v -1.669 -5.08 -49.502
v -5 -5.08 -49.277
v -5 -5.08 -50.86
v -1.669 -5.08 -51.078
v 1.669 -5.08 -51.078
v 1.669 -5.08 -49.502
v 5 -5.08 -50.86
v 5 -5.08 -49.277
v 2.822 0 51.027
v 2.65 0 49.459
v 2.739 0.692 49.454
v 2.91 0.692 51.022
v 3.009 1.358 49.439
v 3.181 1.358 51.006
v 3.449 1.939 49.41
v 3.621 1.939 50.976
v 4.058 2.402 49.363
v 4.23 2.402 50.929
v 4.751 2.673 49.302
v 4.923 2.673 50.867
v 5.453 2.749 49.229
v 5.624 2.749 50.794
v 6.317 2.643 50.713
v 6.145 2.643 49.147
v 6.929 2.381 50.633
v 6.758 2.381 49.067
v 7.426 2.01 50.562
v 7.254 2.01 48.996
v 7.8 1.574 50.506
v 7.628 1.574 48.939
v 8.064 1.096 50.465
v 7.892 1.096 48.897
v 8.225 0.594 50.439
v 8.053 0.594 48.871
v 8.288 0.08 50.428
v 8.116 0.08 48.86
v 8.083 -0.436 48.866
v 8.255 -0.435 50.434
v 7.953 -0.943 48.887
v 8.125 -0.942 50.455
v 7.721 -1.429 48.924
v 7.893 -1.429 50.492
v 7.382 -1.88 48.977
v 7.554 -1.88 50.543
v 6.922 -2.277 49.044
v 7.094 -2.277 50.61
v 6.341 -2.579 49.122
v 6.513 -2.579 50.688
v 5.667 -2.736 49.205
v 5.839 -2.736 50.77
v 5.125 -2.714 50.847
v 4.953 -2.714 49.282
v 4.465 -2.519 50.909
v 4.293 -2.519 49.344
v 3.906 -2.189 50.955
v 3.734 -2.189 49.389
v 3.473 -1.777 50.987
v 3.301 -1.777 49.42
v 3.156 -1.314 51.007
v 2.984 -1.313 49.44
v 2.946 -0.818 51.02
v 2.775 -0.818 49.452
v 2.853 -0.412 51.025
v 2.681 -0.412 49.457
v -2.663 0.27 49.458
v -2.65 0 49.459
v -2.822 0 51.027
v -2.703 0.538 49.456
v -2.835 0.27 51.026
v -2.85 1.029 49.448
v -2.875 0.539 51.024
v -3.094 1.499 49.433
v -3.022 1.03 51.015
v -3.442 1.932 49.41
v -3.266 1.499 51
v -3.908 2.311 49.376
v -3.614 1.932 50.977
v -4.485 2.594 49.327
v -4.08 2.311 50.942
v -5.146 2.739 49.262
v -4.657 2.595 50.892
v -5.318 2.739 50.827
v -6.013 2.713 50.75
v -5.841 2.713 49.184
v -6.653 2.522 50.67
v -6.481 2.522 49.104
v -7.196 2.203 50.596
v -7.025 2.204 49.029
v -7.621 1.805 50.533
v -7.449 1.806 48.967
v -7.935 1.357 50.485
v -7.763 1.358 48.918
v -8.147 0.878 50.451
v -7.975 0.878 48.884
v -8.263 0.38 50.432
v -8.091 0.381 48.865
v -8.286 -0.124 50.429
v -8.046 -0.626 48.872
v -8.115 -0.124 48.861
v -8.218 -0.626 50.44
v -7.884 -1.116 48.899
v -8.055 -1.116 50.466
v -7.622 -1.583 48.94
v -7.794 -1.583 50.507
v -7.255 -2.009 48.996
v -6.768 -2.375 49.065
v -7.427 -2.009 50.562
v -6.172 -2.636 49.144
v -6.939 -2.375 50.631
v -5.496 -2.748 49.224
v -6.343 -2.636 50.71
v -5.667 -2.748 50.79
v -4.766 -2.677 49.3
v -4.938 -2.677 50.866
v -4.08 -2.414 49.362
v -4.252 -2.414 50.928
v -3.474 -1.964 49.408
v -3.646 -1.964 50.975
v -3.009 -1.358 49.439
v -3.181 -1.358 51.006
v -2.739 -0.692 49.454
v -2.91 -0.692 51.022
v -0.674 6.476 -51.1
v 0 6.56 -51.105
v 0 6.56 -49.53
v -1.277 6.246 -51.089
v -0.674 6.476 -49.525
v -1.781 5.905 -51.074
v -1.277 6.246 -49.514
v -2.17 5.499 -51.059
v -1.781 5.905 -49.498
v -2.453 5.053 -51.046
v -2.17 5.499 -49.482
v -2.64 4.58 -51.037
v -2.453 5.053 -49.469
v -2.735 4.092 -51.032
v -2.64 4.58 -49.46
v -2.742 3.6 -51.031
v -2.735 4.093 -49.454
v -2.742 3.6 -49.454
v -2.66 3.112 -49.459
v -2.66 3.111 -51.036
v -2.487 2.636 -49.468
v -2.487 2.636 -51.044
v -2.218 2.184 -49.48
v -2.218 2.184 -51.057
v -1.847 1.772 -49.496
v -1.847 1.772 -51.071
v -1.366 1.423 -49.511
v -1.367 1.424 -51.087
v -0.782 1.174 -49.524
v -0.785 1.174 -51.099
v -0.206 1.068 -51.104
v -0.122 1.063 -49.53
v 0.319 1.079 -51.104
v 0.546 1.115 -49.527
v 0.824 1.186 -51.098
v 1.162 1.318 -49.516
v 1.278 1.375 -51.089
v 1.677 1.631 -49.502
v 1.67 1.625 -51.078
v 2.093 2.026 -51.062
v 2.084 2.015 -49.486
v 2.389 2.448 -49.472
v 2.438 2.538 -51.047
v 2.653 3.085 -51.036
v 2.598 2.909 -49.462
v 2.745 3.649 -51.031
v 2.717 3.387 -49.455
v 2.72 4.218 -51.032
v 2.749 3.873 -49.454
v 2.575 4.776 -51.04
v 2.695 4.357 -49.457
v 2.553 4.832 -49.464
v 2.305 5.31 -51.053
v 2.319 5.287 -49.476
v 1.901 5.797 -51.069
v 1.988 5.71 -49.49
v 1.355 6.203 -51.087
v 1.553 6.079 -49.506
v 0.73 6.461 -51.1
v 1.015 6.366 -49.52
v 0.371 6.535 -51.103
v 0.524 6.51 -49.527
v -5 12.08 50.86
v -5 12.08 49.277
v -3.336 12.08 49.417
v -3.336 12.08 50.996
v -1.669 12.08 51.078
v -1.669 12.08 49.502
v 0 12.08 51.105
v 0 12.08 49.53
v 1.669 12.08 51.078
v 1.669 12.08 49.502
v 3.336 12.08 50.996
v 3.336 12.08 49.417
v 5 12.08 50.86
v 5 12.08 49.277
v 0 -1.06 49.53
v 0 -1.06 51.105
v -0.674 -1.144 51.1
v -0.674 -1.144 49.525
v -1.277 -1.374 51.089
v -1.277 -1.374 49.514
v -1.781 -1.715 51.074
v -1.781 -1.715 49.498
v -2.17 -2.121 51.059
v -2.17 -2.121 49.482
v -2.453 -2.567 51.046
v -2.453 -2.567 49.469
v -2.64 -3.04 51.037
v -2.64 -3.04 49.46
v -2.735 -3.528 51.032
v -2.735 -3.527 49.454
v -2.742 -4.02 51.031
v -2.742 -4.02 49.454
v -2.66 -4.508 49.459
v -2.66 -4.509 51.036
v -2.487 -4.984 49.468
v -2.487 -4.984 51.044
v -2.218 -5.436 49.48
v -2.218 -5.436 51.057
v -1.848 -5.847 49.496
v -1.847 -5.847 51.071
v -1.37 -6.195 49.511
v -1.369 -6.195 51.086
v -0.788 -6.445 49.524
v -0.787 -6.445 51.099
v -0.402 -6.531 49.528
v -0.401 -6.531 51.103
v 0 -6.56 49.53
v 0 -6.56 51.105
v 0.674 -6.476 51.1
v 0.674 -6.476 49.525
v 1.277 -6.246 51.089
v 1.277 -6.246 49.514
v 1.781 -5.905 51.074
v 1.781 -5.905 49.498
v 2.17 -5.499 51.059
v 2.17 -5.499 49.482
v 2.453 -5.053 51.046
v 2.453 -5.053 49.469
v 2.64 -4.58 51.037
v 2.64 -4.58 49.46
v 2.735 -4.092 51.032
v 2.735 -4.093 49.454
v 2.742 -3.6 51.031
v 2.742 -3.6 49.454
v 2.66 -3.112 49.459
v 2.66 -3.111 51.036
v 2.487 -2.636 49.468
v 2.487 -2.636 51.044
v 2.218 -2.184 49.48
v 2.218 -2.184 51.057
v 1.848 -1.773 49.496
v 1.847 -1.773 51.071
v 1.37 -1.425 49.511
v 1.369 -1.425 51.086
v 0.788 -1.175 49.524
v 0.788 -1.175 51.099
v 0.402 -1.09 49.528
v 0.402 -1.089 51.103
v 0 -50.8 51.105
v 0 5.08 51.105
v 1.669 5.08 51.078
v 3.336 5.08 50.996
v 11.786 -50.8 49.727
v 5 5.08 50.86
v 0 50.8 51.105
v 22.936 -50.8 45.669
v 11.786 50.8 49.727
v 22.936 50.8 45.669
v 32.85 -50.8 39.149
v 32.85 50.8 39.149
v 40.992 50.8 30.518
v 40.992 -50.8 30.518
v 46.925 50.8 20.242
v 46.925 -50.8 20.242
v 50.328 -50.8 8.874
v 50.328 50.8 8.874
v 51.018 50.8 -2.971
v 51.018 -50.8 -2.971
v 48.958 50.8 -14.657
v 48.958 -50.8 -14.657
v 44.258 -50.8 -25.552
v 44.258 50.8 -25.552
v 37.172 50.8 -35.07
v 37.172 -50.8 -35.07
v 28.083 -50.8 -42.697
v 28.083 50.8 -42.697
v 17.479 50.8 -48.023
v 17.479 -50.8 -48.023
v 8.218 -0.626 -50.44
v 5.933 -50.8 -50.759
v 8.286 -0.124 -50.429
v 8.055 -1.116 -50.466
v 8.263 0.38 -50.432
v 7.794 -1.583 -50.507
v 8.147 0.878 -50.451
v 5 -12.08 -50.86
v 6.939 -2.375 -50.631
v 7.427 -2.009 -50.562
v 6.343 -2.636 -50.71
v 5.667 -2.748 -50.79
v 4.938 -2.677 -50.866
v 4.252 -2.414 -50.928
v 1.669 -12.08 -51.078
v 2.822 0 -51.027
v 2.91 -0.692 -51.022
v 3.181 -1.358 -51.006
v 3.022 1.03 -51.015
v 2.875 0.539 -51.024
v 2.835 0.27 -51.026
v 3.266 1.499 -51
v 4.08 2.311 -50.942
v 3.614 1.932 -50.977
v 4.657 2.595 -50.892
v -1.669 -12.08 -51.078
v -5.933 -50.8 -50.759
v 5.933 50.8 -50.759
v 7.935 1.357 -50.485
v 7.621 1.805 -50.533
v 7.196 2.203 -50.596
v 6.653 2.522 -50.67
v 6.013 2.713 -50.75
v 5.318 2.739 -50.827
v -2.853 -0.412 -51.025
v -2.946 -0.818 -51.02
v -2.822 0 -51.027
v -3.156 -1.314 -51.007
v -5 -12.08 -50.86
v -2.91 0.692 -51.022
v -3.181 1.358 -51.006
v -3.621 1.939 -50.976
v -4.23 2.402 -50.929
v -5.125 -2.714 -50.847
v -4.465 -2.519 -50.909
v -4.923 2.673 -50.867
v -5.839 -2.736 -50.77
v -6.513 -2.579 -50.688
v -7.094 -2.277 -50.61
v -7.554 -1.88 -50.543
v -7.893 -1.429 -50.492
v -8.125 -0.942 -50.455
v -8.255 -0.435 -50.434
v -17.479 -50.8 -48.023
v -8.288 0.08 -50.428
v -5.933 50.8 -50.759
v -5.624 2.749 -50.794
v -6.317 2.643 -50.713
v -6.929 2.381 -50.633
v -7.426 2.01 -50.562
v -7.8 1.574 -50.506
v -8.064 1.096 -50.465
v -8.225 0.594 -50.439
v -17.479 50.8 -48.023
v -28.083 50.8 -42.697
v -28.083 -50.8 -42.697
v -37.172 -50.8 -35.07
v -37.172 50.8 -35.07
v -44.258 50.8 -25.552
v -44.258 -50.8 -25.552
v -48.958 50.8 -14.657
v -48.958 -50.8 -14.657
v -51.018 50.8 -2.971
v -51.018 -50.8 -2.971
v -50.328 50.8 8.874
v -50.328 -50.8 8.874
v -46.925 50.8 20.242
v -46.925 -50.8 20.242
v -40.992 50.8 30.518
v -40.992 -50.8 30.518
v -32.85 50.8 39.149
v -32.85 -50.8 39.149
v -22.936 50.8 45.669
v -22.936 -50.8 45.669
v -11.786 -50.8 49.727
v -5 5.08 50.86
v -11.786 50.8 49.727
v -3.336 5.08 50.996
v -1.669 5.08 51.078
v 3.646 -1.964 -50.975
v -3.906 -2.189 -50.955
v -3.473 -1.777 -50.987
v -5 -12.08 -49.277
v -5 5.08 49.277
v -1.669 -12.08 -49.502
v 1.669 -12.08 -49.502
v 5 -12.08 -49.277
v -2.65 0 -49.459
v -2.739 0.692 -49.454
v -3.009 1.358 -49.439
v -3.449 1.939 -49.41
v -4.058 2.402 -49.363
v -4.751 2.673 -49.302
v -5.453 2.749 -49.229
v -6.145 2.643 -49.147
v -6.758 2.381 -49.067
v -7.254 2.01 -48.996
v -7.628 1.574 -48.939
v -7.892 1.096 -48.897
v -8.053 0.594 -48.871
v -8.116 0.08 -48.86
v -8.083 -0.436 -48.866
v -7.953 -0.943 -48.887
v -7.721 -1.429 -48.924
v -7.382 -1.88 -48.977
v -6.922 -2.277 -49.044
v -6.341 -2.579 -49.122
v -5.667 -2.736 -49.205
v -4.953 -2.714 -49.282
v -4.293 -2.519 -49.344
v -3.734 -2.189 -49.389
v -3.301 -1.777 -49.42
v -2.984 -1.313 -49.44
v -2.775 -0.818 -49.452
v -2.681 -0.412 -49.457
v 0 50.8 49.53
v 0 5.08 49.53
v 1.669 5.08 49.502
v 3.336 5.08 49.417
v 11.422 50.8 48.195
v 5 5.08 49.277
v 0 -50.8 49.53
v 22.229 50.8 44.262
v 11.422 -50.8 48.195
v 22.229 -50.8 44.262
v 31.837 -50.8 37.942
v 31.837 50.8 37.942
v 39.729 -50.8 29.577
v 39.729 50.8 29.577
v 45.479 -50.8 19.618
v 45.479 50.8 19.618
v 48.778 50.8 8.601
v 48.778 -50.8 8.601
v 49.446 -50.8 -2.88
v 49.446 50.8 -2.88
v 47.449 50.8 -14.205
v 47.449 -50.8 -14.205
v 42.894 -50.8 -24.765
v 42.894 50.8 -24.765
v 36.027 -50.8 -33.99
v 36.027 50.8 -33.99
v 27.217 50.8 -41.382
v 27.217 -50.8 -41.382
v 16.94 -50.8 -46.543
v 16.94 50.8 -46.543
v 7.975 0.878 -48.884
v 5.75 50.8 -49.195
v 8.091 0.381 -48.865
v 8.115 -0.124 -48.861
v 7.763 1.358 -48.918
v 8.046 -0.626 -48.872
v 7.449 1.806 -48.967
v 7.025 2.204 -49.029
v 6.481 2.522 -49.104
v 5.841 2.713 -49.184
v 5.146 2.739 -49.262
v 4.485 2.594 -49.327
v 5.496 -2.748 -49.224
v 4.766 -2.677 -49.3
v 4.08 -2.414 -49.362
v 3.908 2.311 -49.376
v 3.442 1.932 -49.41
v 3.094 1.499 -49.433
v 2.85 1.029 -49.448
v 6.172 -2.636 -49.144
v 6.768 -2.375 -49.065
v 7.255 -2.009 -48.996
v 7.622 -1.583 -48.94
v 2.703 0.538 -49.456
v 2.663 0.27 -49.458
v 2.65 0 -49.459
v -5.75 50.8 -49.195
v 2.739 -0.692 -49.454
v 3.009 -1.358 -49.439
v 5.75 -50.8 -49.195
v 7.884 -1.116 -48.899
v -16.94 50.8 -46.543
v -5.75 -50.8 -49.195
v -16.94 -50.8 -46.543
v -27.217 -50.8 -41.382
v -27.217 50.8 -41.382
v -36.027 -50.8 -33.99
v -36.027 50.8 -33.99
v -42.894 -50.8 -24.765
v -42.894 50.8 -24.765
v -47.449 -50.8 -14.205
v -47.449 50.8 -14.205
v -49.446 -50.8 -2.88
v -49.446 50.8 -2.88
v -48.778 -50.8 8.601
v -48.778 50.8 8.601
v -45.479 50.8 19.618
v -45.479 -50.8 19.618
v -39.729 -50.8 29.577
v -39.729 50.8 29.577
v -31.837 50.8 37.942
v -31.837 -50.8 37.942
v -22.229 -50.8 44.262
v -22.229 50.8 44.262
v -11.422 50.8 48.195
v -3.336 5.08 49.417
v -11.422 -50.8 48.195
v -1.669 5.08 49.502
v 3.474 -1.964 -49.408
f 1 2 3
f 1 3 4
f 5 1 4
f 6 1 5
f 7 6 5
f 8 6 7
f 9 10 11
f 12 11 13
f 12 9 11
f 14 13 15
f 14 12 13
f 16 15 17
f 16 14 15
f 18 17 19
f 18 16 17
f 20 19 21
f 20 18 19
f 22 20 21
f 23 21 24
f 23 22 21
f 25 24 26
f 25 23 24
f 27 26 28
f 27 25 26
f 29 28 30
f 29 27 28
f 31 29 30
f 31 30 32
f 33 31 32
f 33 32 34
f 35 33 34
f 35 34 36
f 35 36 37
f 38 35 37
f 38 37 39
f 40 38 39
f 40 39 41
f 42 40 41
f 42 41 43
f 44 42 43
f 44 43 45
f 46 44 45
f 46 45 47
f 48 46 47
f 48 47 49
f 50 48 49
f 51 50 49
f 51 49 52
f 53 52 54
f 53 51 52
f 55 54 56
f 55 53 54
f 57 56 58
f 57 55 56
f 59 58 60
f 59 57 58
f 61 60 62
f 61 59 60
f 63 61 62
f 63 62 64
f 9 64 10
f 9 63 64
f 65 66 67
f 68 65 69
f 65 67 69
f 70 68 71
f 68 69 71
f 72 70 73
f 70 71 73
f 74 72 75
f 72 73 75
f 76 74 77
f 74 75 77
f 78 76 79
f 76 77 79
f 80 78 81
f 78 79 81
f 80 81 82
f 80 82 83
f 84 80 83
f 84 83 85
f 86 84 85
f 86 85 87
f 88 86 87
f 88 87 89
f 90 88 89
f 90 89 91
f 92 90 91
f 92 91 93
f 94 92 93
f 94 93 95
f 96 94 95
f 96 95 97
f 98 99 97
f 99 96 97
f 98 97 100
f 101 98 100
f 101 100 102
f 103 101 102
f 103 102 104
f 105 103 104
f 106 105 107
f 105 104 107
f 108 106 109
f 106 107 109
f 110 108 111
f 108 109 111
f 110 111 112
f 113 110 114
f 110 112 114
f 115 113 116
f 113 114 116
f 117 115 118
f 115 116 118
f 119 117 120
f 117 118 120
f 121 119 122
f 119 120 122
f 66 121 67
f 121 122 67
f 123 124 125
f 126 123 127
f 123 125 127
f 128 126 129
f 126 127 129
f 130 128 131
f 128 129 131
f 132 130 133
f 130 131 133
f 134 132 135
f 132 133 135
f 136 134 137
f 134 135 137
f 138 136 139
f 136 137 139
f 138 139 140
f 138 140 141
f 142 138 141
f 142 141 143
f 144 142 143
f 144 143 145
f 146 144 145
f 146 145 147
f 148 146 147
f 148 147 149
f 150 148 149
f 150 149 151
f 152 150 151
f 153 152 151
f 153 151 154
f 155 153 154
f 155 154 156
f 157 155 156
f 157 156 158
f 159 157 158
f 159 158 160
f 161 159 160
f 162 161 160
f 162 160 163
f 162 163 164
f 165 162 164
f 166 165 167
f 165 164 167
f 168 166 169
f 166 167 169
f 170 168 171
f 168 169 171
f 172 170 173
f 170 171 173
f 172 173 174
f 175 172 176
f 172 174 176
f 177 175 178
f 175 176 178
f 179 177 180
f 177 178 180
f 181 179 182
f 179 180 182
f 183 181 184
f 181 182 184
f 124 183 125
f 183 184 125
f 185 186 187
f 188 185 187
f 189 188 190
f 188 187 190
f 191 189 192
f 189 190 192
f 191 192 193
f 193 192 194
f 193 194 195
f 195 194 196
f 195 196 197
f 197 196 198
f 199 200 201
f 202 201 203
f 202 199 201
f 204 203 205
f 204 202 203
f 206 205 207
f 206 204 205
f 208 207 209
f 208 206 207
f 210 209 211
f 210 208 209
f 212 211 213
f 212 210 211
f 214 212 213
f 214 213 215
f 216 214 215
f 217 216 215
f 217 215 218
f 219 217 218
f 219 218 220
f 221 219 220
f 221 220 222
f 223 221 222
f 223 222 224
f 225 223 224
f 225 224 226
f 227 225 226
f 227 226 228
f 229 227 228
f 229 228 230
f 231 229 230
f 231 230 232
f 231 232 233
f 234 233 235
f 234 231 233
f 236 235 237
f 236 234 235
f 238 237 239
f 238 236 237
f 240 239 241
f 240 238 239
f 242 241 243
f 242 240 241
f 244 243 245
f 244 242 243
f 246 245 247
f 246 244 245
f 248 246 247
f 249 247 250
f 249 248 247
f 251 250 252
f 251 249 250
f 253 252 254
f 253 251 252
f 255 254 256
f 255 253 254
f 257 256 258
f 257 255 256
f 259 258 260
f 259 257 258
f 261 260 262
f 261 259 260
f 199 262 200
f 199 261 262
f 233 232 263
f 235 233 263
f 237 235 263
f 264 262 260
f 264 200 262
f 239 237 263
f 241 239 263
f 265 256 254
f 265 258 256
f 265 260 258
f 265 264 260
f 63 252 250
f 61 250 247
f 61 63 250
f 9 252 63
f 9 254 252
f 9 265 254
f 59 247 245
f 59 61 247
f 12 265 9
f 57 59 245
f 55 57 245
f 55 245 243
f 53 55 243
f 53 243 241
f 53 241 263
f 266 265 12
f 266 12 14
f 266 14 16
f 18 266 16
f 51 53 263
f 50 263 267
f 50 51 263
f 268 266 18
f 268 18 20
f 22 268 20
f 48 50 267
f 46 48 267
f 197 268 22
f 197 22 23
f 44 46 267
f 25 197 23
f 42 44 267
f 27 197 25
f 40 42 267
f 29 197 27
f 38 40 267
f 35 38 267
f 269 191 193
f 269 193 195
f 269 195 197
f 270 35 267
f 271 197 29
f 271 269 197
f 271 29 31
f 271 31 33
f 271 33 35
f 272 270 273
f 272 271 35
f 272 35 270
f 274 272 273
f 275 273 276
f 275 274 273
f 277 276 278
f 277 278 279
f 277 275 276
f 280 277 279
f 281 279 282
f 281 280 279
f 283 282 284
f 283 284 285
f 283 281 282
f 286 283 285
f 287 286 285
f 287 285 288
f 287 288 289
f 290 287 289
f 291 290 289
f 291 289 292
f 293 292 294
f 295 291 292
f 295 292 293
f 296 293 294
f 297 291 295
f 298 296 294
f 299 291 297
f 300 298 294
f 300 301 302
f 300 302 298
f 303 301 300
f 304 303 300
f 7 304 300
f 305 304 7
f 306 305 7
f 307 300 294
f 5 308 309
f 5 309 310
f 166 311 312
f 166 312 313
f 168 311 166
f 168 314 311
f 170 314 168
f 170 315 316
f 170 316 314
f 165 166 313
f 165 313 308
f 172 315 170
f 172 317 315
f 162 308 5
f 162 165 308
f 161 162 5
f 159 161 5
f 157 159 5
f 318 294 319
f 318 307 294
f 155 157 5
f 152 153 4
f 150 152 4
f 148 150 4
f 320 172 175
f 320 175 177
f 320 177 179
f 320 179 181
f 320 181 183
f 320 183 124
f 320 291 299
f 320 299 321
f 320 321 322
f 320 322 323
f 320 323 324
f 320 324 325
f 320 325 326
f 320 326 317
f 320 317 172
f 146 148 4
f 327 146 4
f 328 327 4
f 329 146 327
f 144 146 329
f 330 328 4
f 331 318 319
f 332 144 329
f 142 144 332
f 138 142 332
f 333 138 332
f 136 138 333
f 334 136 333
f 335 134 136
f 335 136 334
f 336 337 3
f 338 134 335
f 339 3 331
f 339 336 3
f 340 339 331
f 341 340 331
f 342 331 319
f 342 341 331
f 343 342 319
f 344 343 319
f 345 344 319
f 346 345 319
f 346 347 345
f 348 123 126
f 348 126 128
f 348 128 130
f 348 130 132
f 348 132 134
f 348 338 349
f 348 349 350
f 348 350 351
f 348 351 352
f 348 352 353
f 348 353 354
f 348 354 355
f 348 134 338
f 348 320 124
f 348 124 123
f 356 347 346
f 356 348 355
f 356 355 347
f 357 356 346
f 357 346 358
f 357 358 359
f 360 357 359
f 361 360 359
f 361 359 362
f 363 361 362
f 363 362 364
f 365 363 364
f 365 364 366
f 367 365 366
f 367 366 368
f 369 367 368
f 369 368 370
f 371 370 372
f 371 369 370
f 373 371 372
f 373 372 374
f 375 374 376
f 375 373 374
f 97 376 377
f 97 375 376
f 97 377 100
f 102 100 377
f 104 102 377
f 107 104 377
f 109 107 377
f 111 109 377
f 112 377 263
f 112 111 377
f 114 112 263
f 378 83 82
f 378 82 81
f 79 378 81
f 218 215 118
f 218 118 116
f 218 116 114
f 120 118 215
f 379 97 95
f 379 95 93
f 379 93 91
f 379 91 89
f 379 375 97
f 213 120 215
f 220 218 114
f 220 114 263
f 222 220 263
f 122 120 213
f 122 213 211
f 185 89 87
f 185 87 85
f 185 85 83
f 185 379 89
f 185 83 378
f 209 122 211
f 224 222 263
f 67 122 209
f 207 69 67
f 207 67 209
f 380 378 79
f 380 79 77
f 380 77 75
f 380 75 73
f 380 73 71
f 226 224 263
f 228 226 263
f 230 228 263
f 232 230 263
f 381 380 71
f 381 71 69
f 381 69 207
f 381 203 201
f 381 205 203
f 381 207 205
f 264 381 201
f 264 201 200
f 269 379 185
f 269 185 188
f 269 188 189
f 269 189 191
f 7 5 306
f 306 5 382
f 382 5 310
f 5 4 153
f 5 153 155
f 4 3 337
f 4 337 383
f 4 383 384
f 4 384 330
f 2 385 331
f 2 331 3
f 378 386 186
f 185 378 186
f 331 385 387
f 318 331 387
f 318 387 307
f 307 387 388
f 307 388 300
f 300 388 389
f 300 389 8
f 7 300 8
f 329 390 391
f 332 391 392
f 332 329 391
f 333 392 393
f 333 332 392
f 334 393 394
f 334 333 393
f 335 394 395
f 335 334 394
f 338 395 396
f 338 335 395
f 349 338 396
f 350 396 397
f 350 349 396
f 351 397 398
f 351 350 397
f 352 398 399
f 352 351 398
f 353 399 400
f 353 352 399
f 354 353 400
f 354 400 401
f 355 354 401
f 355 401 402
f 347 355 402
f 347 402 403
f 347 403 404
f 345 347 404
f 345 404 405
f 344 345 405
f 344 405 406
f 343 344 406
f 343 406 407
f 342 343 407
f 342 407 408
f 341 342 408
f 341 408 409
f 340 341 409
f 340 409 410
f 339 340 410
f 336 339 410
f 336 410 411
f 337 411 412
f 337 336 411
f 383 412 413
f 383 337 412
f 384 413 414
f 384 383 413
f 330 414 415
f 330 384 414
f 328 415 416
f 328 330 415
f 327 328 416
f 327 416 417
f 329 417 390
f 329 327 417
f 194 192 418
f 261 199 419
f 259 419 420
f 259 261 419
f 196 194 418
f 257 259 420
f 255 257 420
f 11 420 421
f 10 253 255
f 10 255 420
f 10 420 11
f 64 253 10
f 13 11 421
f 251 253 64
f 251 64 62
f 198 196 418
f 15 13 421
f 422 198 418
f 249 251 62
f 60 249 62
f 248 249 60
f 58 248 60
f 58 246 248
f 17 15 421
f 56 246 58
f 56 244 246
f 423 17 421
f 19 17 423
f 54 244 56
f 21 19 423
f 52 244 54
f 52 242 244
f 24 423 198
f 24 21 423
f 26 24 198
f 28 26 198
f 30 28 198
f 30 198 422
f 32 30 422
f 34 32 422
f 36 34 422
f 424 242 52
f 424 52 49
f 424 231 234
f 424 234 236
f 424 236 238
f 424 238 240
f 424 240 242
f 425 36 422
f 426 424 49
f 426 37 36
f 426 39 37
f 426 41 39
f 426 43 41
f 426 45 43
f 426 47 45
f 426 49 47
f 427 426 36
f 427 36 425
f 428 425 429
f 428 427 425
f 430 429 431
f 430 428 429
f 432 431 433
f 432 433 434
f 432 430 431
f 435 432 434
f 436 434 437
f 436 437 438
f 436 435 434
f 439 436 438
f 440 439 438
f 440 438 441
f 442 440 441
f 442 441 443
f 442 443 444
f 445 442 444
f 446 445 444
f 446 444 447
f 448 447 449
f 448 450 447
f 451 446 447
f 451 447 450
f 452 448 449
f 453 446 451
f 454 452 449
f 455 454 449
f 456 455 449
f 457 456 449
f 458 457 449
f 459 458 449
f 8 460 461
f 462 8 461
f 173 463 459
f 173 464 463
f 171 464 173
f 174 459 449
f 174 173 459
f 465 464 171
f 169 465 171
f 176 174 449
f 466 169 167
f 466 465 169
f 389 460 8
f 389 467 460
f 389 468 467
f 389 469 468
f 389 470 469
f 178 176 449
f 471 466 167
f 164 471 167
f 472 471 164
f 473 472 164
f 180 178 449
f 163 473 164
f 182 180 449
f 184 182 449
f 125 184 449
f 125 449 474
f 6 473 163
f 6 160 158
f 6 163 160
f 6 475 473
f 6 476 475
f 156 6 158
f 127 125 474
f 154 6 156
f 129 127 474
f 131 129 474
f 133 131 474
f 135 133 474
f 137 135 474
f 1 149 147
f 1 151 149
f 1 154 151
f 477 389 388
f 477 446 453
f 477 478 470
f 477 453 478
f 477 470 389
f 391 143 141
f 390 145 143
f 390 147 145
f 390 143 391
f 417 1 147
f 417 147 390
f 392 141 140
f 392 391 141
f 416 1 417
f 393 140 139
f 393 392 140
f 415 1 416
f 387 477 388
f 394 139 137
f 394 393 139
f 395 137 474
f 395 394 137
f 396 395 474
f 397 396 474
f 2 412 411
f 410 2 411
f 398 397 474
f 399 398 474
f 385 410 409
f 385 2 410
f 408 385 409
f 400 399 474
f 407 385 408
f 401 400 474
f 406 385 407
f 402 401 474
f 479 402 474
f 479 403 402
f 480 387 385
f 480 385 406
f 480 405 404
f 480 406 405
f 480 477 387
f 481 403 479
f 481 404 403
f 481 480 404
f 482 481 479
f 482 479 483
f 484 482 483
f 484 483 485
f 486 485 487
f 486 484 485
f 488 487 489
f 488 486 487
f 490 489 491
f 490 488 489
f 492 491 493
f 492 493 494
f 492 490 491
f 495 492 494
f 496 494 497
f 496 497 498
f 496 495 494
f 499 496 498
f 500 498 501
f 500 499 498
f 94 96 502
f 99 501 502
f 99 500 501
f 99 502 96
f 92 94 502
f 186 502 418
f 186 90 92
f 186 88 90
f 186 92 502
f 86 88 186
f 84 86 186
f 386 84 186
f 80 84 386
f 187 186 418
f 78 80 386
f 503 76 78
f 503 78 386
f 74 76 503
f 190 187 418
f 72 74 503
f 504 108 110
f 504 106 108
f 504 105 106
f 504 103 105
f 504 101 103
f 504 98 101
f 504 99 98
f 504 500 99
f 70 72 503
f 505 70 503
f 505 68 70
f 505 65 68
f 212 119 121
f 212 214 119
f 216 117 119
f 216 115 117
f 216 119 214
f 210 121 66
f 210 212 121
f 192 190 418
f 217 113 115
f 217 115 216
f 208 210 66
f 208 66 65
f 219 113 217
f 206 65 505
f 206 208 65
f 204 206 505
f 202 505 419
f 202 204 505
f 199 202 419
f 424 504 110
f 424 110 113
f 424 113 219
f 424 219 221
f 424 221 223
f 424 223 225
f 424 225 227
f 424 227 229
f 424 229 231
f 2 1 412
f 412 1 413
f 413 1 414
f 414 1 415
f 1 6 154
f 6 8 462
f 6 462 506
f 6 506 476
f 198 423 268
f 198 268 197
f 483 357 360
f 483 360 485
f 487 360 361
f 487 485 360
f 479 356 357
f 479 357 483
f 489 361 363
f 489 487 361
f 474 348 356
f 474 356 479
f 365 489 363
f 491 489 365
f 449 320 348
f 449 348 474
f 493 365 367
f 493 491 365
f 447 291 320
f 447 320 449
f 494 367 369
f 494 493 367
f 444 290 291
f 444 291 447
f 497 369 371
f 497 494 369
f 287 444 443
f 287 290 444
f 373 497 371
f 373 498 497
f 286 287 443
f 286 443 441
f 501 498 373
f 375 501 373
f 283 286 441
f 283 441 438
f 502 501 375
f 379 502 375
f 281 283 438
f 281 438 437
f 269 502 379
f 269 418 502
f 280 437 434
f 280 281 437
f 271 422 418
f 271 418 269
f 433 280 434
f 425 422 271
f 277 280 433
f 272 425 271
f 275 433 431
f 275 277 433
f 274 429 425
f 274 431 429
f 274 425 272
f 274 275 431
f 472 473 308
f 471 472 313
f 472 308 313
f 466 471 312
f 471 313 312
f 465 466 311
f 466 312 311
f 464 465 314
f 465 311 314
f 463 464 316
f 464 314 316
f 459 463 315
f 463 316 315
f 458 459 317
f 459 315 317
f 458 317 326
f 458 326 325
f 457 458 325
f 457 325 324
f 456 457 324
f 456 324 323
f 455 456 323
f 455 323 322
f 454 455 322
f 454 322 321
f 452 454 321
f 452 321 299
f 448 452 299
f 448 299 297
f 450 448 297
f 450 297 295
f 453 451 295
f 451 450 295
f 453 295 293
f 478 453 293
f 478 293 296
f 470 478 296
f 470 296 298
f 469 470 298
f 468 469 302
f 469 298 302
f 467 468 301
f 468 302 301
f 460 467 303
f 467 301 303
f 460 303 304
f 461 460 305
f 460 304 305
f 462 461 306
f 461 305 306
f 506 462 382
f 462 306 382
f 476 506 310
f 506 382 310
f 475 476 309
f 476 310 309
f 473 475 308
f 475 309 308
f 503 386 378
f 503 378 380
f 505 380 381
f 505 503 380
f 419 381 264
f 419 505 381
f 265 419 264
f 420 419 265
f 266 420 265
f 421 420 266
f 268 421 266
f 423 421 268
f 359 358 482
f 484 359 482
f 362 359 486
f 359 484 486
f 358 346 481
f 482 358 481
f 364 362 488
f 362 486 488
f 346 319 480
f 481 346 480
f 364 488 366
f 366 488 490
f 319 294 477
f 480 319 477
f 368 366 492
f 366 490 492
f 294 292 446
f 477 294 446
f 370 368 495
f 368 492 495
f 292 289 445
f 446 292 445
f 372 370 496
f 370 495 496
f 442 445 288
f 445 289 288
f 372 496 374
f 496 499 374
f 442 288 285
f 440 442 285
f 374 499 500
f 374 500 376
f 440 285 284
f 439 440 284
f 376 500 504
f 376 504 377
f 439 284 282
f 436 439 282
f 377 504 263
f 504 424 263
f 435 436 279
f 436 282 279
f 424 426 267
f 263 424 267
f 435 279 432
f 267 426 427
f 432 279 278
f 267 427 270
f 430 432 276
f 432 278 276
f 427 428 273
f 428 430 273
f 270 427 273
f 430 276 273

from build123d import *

# Parameters (mm, degrees)
SKETCH1_R               = 51.1048
SKETCH1_R_2             = 49.53
BOSS_EXTRUDE1_DEPTH     = 50.8
CUT_SWEEP1_START        = -51.104800053
CUT_SWEEP1_OUTLINE_R    = 2.749999961
CUT_SWEEP1_DEPTH        = 1.651201698
MIRROR2_START           = -51.104800053
MIRROR2_COPY_1_SKETCH_R = 2.749999961
MIRROR2_COPY_1_DEPTH    = 1.651201698
SKETCH18_R              = 2.749999961
SKETCH18_W              = 10.000000066
SKETCH18_H              = 6.99999997
CUT_EXTRUDE1_DEPTH      = 89.340484472
SKETCH18_3_R            = 2.749999961
SKETCH18_3_W            = 10.000000066
SKETCH18_3_H            = 6.99999997
CUT_EXTRUDE2_DEPTH      = 89.340484472


# Read off the part's stored shape, not the designer's step: Cut-Sweep1
with BuildPart() as part:
    # Sketch1 → Boss-Extrude1 (new, symmetric)
    with BuildSketch(Plane(origin=(0, 0, 0), x_dir=(1, 0, 0), z_dir=(0, 1, 0))):
        with Locations(Location((0, 0, 0), (0, 0, 270))):
            Circle(SKETCH1_R)
        with Locations(Location((0, 0, 0), (0, 0, 270))):
            Circle(SKETCH1_R_2, mode=Mode.SUBTRACT)
    extrude(amount=BOSS_EXTRUDE1_DEPTH, both=True)

    # Cut-Sweep1 outline → Cut-Sweep1 (cut)
    with BuildSketch(Plane(origin=(0, 0, 0), x_dir=(0.9940563382223202, 0, -0.10886687485195803), z_dir=(0.10886687485195805, 0, 0.9940563382223203)).offset(CUT_SWEEP1_START)):
        Circle(CUT_SWEEP1_OUTLINE_R)
    cut_sweep1 = extrude(amount=CUT_SWEEP1_DEPTH, mode=Mode.SUBTRACT)

    # Mirror1: Cut-Sweep1 across plane
    add(cut_sweep1.mirror(Plane(origin=(0, 0, 0), x_dir=(0, 0, 1), z_dir=(1, 0, 0))), mode=Mode.SUBTRACT)

    # Mirror2: Cut-Sweep1 across plane
    add(cut_sweep1.mirror(Plane.XY), mode=Mode.SUBTRACT)

    # Mirror2 copy 1 sketch → Mirror2 copy 1 (cut)
    with BuildSketch(Plane(origin=(0, 0, 0), x_dir=(-0.9940563382223202, 0, 0.10886687485195803), z_dir=(-0.10886687485195805, 0, -0.9940563382223203)).offset(MIRROR2_START)):
        Circle(MIRROR2_COPY_1_SKETCH_R)
    extrude(amount=MIRROR2_COPY_1_DEPTH, mode=Mode.SUBTRACT)

    # Sketch18 → Cut-Extrude1 (cut, through all)
    with BuildSketch(Plane.XY):
        with Locations(Location((0, 3.81, 0), (0, 0, 90))):
            Circle(SKETCH18_R)
        with Locations((0, -8.579999985)):
            Rectangle(SKETCH18_W, SKETCH18_H)
    extrude(amount=-CUT_EXTRUDE1_DEPTH, mode=Mode.SUBTRACT)

    # Sketch18<3> → Cut-Extrude2 (cut, through all)
    with BuildSketch(Plane.XY):
        with Locations(Location((0, -3.81, 0), (0, 0, 89.999999966))):
            Circle(SKETCH18_3_R)
        with Locations((0, 8.579999985)):
            Rectangle(SKETCH18_3_W, SKETCH18_3_H)
    extrude(amount=CUT_EXTRUDE2_DEPTH, mode=Mode.SUBTRACT)


solid = part.part
